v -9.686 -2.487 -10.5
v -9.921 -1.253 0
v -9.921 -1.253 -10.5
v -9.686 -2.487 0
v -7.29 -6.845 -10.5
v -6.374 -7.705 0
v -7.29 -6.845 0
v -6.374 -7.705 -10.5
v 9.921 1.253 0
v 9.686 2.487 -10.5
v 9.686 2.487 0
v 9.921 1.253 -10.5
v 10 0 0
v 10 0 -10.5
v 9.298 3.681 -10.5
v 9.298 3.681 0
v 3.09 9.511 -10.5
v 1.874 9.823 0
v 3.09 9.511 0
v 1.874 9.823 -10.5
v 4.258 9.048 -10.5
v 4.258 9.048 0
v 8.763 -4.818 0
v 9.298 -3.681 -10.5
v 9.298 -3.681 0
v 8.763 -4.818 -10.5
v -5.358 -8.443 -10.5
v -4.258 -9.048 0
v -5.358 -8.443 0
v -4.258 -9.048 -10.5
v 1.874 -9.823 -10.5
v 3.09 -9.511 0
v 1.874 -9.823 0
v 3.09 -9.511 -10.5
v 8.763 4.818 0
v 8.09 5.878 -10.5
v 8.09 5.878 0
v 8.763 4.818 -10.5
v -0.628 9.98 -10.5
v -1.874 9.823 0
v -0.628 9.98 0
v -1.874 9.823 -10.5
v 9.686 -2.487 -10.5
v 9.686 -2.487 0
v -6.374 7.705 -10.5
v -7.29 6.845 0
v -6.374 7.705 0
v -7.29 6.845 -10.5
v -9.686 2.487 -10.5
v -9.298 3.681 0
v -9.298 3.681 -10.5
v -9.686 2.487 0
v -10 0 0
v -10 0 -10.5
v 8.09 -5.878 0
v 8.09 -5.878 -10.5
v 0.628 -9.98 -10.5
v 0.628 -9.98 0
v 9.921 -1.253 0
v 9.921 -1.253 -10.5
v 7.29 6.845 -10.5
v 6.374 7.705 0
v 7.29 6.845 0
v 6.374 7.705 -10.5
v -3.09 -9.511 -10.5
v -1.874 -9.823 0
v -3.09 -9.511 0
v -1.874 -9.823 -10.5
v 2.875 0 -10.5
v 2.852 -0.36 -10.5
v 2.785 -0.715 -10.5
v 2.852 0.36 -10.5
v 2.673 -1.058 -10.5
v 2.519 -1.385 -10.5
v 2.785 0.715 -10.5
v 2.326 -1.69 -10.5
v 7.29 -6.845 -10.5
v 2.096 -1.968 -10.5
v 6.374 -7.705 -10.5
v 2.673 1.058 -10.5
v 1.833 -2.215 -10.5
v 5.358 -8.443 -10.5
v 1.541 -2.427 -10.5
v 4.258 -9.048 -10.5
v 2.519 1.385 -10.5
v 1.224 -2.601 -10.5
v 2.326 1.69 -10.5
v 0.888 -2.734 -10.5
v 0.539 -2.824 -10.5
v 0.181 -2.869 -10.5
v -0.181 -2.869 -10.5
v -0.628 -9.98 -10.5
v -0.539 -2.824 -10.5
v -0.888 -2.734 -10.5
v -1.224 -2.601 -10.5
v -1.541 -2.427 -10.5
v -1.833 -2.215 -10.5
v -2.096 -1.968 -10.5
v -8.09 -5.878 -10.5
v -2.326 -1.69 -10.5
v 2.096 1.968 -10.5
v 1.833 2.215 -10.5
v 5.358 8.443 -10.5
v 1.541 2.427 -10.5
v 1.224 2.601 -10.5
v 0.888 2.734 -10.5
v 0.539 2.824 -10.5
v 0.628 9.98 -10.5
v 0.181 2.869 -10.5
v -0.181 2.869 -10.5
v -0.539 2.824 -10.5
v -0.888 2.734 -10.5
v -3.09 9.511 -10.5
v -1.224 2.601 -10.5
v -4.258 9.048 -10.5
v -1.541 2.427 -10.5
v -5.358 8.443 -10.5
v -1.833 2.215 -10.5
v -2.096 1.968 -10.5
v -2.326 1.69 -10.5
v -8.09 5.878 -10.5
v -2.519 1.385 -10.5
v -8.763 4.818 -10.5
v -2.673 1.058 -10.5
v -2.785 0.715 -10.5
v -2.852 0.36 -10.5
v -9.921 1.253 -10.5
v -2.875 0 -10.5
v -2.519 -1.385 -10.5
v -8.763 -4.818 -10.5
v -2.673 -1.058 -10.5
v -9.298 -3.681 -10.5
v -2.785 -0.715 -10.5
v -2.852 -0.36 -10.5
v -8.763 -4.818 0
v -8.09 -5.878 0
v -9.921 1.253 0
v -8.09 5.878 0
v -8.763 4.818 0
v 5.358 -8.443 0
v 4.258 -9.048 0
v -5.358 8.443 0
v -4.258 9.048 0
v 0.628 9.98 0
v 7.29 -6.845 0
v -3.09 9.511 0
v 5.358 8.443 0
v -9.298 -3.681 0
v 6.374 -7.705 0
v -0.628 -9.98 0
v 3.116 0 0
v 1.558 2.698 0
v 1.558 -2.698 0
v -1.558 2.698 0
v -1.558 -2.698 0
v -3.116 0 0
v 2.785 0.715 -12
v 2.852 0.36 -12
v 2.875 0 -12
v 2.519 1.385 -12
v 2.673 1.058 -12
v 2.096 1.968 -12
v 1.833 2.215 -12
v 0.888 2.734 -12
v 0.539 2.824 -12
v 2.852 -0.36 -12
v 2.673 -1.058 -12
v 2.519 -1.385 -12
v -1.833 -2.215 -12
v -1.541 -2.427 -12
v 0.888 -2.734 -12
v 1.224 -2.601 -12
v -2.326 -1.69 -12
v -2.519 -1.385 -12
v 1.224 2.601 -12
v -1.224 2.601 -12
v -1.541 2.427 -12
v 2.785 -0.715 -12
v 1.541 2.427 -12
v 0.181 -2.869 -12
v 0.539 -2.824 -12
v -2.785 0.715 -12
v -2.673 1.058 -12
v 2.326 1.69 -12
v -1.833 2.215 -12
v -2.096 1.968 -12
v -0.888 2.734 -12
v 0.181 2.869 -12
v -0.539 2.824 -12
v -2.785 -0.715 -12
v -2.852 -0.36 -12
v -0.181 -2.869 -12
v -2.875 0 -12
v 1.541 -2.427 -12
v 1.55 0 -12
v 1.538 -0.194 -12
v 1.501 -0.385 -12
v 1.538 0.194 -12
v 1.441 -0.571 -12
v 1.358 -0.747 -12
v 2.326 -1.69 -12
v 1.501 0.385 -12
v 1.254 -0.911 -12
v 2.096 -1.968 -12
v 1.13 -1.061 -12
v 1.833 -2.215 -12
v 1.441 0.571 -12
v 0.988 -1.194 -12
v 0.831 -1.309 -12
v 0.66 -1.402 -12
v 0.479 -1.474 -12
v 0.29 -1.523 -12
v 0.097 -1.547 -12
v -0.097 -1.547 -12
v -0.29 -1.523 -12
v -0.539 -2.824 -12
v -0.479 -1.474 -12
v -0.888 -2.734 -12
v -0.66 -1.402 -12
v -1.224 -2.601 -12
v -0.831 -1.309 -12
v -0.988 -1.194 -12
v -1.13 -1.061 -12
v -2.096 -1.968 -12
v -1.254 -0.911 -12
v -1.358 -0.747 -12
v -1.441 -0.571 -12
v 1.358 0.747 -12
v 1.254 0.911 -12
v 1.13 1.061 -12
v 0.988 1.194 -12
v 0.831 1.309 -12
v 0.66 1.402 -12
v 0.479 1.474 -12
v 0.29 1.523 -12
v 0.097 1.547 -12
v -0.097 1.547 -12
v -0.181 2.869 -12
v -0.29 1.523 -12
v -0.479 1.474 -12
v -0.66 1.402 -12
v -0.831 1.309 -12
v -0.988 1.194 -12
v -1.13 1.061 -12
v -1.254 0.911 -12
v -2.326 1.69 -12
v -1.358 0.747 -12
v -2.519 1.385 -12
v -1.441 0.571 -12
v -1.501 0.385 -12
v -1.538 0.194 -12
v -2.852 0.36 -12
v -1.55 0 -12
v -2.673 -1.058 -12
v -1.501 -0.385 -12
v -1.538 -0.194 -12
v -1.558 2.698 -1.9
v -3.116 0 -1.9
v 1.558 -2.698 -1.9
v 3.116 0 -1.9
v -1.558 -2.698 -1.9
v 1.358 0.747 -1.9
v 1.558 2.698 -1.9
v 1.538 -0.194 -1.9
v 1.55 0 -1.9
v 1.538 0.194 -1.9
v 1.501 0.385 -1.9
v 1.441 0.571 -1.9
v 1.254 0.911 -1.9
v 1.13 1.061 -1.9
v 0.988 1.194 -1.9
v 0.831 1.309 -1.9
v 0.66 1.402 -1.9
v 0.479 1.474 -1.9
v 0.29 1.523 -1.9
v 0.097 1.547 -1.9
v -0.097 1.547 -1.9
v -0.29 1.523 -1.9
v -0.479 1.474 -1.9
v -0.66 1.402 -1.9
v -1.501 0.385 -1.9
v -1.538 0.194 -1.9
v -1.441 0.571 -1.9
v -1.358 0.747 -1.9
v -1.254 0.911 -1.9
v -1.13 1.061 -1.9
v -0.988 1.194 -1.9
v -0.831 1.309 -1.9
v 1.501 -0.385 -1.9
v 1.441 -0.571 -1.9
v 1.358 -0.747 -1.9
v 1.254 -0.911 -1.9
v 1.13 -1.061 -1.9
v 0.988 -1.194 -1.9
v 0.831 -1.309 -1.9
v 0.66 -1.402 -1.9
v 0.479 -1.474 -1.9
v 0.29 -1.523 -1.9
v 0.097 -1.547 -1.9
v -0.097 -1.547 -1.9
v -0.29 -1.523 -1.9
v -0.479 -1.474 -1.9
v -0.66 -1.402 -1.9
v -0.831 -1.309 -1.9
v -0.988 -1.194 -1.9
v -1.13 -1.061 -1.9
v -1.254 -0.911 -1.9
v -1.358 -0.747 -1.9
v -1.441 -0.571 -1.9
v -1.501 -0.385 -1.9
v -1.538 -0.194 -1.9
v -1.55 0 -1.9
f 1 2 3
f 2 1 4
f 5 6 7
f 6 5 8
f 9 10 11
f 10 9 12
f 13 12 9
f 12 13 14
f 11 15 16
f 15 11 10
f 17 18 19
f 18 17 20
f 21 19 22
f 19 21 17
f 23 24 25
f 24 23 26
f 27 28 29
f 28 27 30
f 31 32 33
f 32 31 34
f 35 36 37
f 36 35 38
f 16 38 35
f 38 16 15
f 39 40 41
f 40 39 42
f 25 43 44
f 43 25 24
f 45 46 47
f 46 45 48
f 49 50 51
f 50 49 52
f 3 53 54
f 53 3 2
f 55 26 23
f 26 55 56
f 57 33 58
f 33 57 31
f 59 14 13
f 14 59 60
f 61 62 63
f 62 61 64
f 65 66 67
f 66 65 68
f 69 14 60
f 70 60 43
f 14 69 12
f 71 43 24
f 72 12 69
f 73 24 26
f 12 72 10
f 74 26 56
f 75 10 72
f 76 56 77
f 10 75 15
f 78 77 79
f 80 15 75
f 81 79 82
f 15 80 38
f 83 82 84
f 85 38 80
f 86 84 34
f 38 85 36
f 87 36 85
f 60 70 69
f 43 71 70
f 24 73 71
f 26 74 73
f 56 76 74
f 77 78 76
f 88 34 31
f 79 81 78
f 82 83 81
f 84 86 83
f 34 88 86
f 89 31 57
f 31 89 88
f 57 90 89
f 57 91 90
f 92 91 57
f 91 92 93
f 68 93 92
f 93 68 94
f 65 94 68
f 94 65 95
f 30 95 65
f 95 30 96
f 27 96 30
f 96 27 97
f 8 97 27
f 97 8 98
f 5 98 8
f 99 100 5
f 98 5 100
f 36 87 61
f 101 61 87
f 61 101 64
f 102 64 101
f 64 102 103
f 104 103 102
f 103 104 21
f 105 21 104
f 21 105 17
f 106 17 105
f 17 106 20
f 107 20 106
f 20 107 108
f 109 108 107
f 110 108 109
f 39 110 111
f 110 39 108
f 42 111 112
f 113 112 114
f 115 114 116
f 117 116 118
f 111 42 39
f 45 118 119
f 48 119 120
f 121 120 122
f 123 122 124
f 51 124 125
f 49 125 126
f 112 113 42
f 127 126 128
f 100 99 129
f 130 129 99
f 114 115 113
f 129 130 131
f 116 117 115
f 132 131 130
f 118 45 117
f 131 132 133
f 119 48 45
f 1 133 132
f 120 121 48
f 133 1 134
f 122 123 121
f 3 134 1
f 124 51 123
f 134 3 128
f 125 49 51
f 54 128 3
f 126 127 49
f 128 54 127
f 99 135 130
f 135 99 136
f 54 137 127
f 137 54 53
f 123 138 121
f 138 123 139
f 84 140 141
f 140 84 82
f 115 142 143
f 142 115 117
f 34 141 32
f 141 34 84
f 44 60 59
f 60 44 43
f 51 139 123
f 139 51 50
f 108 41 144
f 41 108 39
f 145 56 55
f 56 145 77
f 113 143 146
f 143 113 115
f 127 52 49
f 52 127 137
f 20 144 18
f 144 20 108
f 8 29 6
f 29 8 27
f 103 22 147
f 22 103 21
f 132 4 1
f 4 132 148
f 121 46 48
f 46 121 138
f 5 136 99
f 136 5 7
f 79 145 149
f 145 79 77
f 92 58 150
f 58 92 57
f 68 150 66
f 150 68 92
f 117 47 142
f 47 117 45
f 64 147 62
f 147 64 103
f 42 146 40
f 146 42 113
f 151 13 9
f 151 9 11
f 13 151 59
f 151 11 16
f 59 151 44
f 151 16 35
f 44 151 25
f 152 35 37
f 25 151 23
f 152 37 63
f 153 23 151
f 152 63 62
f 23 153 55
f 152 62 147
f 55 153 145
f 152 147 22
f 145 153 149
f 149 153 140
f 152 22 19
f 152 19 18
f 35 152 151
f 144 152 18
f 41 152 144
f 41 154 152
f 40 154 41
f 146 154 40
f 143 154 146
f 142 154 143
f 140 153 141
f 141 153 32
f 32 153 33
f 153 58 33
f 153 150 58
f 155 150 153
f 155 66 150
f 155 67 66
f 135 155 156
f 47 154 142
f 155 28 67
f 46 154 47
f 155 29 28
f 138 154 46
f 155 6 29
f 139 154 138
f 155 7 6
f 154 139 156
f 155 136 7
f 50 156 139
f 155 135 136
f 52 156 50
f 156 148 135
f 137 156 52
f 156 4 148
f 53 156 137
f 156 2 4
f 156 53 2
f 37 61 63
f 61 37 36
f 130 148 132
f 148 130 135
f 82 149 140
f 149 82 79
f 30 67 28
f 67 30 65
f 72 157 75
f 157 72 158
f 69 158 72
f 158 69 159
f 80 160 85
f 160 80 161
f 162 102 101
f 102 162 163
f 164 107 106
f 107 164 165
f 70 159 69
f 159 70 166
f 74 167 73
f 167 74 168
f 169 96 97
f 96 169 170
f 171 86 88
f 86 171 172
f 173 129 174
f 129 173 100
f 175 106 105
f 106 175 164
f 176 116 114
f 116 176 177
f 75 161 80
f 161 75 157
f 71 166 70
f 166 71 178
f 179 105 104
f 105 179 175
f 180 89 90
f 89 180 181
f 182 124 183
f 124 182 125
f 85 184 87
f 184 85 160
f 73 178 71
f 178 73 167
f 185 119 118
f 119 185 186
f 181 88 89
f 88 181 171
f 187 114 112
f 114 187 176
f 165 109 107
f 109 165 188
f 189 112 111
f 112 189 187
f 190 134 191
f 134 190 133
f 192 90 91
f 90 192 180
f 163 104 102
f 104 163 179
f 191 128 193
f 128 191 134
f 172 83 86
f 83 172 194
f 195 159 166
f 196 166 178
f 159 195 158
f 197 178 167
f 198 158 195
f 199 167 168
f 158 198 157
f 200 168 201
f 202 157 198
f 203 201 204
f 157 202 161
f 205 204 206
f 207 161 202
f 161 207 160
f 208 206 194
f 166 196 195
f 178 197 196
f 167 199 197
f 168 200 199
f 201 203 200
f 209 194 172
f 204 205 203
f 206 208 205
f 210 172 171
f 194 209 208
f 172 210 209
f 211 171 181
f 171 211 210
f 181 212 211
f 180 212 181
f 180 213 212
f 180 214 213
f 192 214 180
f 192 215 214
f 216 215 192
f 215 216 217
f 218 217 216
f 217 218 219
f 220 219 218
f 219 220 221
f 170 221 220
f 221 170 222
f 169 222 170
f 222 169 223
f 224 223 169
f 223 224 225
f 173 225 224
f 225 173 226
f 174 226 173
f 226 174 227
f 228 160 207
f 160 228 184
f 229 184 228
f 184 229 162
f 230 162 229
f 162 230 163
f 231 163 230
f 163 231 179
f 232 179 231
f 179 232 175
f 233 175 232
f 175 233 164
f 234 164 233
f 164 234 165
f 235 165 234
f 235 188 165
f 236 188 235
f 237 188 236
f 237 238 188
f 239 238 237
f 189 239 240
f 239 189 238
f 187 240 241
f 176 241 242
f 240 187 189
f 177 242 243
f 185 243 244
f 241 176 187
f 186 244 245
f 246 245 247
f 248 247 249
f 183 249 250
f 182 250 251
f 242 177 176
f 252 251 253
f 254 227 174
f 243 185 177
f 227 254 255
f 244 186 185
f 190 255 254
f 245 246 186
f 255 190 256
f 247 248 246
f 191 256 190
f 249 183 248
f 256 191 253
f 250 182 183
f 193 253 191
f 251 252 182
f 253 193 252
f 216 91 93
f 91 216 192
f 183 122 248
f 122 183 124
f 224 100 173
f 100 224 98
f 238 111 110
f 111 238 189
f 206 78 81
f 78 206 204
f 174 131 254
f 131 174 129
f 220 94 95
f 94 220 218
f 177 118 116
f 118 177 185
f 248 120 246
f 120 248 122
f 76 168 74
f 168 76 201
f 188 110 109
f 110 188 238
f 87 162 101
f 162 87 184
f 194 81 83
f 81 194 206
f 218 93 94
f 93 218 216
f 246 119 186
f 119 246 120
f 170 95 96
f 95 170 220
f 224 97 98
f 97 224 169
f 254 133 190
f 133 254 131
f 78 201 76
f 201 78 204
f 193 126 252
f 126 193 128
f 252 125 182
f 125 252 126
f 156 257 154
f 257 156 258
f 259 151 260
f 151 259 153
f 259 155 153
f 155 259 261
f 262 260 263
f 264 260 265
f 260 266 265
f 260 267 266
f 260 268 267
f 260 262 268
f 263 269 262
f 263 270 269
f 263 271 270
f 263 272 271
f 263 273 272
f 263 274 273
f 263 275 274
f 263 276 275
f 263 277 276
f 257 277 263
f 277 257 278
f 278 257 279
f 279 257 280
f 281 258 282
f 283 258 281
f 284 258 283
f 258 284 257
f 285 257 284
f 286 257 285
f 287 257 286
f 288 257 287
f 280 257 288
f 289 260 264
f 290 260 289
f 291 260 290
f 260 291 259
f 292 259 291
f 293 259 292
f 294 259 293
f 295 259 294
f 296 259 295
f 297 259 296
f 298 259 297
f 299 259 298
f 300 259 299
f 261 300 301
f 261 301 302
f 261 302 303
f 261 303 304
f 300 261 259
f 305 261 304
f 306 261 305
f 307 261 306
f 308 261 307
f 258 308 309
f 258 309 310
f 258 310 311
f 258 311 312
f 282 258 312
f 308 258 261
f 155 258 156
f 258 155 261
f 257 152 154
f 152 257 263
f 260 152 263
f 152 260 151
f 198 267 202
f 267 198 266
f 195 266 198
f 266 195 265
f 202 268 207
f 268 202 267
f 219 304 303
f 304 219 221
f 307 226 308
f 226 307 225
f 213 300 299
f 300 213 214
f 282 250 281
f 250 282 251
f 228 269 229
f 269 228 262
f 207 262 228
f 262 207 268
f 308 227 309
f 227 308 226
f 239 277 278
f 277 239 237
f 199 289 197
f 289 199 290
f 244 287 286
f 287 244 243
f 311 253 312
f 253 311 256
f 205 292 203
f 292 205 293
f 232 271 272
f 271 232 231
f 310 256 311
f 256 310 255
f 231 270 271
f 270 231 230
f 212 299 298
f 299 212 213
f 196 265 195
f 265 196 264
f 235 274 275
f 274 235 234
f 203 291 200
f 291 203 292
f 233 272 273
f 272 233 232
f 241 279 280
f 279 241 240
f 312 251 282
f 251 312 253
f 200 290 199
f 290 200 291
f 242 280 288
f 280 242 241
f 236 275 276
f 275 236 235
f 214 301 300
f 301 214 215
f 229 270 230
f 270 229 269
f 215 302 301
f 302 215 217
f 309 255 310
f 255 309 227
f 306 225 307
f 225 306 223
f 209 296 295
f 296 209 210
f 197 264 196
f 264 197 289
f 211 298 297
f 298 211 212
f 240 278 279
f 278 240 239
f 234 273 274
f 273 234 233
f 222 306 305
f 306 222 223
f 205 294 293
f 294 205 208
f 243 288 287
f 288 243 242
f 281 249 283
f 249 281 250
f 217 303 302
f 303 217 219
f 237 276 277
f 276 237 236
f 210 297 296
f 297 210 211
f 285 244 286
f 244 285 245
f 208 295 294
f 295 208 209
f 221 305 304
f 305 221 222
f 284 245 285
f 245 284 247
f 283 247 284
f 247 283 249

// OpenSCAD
$fn = 50;


difference() {
	union() {
		translate(v = [0, 0, -10.5000000000]) {
			cylinder(h = 10.5000000000, r = 10.0000000000);
		}
		#translate(v = [0, 0, -12.0000000000]) {
			cylinder(h = 12, r = 2.8750000000);
		}
	}
	union() {
		translate(v = [0, 0, 0]) {
			rotate(a = [0, 0, 0]) {
				difference() {
					union() {
						translate(v = [0, 0, -1.9000000000]) {
							linear_extrude(height = 1.9000000000) {
								polygon(points = [[3.1158000000, 0.0000000000], [1.5579000000, 2.6983619531], [-1.5579000000, 2.6983619531], [-3.1158000000, 0.0000000000], [-1.5579000000, -2.6983619531], [1.5579000000, -2.6983619531]]);
							}
						}
					}
					union();
				}
			}
		}
		#translate(v = [0, 0, -100.0000000000]) {
			cylinder(h = 200, r = 1.5500000000);
		}
	}
}
